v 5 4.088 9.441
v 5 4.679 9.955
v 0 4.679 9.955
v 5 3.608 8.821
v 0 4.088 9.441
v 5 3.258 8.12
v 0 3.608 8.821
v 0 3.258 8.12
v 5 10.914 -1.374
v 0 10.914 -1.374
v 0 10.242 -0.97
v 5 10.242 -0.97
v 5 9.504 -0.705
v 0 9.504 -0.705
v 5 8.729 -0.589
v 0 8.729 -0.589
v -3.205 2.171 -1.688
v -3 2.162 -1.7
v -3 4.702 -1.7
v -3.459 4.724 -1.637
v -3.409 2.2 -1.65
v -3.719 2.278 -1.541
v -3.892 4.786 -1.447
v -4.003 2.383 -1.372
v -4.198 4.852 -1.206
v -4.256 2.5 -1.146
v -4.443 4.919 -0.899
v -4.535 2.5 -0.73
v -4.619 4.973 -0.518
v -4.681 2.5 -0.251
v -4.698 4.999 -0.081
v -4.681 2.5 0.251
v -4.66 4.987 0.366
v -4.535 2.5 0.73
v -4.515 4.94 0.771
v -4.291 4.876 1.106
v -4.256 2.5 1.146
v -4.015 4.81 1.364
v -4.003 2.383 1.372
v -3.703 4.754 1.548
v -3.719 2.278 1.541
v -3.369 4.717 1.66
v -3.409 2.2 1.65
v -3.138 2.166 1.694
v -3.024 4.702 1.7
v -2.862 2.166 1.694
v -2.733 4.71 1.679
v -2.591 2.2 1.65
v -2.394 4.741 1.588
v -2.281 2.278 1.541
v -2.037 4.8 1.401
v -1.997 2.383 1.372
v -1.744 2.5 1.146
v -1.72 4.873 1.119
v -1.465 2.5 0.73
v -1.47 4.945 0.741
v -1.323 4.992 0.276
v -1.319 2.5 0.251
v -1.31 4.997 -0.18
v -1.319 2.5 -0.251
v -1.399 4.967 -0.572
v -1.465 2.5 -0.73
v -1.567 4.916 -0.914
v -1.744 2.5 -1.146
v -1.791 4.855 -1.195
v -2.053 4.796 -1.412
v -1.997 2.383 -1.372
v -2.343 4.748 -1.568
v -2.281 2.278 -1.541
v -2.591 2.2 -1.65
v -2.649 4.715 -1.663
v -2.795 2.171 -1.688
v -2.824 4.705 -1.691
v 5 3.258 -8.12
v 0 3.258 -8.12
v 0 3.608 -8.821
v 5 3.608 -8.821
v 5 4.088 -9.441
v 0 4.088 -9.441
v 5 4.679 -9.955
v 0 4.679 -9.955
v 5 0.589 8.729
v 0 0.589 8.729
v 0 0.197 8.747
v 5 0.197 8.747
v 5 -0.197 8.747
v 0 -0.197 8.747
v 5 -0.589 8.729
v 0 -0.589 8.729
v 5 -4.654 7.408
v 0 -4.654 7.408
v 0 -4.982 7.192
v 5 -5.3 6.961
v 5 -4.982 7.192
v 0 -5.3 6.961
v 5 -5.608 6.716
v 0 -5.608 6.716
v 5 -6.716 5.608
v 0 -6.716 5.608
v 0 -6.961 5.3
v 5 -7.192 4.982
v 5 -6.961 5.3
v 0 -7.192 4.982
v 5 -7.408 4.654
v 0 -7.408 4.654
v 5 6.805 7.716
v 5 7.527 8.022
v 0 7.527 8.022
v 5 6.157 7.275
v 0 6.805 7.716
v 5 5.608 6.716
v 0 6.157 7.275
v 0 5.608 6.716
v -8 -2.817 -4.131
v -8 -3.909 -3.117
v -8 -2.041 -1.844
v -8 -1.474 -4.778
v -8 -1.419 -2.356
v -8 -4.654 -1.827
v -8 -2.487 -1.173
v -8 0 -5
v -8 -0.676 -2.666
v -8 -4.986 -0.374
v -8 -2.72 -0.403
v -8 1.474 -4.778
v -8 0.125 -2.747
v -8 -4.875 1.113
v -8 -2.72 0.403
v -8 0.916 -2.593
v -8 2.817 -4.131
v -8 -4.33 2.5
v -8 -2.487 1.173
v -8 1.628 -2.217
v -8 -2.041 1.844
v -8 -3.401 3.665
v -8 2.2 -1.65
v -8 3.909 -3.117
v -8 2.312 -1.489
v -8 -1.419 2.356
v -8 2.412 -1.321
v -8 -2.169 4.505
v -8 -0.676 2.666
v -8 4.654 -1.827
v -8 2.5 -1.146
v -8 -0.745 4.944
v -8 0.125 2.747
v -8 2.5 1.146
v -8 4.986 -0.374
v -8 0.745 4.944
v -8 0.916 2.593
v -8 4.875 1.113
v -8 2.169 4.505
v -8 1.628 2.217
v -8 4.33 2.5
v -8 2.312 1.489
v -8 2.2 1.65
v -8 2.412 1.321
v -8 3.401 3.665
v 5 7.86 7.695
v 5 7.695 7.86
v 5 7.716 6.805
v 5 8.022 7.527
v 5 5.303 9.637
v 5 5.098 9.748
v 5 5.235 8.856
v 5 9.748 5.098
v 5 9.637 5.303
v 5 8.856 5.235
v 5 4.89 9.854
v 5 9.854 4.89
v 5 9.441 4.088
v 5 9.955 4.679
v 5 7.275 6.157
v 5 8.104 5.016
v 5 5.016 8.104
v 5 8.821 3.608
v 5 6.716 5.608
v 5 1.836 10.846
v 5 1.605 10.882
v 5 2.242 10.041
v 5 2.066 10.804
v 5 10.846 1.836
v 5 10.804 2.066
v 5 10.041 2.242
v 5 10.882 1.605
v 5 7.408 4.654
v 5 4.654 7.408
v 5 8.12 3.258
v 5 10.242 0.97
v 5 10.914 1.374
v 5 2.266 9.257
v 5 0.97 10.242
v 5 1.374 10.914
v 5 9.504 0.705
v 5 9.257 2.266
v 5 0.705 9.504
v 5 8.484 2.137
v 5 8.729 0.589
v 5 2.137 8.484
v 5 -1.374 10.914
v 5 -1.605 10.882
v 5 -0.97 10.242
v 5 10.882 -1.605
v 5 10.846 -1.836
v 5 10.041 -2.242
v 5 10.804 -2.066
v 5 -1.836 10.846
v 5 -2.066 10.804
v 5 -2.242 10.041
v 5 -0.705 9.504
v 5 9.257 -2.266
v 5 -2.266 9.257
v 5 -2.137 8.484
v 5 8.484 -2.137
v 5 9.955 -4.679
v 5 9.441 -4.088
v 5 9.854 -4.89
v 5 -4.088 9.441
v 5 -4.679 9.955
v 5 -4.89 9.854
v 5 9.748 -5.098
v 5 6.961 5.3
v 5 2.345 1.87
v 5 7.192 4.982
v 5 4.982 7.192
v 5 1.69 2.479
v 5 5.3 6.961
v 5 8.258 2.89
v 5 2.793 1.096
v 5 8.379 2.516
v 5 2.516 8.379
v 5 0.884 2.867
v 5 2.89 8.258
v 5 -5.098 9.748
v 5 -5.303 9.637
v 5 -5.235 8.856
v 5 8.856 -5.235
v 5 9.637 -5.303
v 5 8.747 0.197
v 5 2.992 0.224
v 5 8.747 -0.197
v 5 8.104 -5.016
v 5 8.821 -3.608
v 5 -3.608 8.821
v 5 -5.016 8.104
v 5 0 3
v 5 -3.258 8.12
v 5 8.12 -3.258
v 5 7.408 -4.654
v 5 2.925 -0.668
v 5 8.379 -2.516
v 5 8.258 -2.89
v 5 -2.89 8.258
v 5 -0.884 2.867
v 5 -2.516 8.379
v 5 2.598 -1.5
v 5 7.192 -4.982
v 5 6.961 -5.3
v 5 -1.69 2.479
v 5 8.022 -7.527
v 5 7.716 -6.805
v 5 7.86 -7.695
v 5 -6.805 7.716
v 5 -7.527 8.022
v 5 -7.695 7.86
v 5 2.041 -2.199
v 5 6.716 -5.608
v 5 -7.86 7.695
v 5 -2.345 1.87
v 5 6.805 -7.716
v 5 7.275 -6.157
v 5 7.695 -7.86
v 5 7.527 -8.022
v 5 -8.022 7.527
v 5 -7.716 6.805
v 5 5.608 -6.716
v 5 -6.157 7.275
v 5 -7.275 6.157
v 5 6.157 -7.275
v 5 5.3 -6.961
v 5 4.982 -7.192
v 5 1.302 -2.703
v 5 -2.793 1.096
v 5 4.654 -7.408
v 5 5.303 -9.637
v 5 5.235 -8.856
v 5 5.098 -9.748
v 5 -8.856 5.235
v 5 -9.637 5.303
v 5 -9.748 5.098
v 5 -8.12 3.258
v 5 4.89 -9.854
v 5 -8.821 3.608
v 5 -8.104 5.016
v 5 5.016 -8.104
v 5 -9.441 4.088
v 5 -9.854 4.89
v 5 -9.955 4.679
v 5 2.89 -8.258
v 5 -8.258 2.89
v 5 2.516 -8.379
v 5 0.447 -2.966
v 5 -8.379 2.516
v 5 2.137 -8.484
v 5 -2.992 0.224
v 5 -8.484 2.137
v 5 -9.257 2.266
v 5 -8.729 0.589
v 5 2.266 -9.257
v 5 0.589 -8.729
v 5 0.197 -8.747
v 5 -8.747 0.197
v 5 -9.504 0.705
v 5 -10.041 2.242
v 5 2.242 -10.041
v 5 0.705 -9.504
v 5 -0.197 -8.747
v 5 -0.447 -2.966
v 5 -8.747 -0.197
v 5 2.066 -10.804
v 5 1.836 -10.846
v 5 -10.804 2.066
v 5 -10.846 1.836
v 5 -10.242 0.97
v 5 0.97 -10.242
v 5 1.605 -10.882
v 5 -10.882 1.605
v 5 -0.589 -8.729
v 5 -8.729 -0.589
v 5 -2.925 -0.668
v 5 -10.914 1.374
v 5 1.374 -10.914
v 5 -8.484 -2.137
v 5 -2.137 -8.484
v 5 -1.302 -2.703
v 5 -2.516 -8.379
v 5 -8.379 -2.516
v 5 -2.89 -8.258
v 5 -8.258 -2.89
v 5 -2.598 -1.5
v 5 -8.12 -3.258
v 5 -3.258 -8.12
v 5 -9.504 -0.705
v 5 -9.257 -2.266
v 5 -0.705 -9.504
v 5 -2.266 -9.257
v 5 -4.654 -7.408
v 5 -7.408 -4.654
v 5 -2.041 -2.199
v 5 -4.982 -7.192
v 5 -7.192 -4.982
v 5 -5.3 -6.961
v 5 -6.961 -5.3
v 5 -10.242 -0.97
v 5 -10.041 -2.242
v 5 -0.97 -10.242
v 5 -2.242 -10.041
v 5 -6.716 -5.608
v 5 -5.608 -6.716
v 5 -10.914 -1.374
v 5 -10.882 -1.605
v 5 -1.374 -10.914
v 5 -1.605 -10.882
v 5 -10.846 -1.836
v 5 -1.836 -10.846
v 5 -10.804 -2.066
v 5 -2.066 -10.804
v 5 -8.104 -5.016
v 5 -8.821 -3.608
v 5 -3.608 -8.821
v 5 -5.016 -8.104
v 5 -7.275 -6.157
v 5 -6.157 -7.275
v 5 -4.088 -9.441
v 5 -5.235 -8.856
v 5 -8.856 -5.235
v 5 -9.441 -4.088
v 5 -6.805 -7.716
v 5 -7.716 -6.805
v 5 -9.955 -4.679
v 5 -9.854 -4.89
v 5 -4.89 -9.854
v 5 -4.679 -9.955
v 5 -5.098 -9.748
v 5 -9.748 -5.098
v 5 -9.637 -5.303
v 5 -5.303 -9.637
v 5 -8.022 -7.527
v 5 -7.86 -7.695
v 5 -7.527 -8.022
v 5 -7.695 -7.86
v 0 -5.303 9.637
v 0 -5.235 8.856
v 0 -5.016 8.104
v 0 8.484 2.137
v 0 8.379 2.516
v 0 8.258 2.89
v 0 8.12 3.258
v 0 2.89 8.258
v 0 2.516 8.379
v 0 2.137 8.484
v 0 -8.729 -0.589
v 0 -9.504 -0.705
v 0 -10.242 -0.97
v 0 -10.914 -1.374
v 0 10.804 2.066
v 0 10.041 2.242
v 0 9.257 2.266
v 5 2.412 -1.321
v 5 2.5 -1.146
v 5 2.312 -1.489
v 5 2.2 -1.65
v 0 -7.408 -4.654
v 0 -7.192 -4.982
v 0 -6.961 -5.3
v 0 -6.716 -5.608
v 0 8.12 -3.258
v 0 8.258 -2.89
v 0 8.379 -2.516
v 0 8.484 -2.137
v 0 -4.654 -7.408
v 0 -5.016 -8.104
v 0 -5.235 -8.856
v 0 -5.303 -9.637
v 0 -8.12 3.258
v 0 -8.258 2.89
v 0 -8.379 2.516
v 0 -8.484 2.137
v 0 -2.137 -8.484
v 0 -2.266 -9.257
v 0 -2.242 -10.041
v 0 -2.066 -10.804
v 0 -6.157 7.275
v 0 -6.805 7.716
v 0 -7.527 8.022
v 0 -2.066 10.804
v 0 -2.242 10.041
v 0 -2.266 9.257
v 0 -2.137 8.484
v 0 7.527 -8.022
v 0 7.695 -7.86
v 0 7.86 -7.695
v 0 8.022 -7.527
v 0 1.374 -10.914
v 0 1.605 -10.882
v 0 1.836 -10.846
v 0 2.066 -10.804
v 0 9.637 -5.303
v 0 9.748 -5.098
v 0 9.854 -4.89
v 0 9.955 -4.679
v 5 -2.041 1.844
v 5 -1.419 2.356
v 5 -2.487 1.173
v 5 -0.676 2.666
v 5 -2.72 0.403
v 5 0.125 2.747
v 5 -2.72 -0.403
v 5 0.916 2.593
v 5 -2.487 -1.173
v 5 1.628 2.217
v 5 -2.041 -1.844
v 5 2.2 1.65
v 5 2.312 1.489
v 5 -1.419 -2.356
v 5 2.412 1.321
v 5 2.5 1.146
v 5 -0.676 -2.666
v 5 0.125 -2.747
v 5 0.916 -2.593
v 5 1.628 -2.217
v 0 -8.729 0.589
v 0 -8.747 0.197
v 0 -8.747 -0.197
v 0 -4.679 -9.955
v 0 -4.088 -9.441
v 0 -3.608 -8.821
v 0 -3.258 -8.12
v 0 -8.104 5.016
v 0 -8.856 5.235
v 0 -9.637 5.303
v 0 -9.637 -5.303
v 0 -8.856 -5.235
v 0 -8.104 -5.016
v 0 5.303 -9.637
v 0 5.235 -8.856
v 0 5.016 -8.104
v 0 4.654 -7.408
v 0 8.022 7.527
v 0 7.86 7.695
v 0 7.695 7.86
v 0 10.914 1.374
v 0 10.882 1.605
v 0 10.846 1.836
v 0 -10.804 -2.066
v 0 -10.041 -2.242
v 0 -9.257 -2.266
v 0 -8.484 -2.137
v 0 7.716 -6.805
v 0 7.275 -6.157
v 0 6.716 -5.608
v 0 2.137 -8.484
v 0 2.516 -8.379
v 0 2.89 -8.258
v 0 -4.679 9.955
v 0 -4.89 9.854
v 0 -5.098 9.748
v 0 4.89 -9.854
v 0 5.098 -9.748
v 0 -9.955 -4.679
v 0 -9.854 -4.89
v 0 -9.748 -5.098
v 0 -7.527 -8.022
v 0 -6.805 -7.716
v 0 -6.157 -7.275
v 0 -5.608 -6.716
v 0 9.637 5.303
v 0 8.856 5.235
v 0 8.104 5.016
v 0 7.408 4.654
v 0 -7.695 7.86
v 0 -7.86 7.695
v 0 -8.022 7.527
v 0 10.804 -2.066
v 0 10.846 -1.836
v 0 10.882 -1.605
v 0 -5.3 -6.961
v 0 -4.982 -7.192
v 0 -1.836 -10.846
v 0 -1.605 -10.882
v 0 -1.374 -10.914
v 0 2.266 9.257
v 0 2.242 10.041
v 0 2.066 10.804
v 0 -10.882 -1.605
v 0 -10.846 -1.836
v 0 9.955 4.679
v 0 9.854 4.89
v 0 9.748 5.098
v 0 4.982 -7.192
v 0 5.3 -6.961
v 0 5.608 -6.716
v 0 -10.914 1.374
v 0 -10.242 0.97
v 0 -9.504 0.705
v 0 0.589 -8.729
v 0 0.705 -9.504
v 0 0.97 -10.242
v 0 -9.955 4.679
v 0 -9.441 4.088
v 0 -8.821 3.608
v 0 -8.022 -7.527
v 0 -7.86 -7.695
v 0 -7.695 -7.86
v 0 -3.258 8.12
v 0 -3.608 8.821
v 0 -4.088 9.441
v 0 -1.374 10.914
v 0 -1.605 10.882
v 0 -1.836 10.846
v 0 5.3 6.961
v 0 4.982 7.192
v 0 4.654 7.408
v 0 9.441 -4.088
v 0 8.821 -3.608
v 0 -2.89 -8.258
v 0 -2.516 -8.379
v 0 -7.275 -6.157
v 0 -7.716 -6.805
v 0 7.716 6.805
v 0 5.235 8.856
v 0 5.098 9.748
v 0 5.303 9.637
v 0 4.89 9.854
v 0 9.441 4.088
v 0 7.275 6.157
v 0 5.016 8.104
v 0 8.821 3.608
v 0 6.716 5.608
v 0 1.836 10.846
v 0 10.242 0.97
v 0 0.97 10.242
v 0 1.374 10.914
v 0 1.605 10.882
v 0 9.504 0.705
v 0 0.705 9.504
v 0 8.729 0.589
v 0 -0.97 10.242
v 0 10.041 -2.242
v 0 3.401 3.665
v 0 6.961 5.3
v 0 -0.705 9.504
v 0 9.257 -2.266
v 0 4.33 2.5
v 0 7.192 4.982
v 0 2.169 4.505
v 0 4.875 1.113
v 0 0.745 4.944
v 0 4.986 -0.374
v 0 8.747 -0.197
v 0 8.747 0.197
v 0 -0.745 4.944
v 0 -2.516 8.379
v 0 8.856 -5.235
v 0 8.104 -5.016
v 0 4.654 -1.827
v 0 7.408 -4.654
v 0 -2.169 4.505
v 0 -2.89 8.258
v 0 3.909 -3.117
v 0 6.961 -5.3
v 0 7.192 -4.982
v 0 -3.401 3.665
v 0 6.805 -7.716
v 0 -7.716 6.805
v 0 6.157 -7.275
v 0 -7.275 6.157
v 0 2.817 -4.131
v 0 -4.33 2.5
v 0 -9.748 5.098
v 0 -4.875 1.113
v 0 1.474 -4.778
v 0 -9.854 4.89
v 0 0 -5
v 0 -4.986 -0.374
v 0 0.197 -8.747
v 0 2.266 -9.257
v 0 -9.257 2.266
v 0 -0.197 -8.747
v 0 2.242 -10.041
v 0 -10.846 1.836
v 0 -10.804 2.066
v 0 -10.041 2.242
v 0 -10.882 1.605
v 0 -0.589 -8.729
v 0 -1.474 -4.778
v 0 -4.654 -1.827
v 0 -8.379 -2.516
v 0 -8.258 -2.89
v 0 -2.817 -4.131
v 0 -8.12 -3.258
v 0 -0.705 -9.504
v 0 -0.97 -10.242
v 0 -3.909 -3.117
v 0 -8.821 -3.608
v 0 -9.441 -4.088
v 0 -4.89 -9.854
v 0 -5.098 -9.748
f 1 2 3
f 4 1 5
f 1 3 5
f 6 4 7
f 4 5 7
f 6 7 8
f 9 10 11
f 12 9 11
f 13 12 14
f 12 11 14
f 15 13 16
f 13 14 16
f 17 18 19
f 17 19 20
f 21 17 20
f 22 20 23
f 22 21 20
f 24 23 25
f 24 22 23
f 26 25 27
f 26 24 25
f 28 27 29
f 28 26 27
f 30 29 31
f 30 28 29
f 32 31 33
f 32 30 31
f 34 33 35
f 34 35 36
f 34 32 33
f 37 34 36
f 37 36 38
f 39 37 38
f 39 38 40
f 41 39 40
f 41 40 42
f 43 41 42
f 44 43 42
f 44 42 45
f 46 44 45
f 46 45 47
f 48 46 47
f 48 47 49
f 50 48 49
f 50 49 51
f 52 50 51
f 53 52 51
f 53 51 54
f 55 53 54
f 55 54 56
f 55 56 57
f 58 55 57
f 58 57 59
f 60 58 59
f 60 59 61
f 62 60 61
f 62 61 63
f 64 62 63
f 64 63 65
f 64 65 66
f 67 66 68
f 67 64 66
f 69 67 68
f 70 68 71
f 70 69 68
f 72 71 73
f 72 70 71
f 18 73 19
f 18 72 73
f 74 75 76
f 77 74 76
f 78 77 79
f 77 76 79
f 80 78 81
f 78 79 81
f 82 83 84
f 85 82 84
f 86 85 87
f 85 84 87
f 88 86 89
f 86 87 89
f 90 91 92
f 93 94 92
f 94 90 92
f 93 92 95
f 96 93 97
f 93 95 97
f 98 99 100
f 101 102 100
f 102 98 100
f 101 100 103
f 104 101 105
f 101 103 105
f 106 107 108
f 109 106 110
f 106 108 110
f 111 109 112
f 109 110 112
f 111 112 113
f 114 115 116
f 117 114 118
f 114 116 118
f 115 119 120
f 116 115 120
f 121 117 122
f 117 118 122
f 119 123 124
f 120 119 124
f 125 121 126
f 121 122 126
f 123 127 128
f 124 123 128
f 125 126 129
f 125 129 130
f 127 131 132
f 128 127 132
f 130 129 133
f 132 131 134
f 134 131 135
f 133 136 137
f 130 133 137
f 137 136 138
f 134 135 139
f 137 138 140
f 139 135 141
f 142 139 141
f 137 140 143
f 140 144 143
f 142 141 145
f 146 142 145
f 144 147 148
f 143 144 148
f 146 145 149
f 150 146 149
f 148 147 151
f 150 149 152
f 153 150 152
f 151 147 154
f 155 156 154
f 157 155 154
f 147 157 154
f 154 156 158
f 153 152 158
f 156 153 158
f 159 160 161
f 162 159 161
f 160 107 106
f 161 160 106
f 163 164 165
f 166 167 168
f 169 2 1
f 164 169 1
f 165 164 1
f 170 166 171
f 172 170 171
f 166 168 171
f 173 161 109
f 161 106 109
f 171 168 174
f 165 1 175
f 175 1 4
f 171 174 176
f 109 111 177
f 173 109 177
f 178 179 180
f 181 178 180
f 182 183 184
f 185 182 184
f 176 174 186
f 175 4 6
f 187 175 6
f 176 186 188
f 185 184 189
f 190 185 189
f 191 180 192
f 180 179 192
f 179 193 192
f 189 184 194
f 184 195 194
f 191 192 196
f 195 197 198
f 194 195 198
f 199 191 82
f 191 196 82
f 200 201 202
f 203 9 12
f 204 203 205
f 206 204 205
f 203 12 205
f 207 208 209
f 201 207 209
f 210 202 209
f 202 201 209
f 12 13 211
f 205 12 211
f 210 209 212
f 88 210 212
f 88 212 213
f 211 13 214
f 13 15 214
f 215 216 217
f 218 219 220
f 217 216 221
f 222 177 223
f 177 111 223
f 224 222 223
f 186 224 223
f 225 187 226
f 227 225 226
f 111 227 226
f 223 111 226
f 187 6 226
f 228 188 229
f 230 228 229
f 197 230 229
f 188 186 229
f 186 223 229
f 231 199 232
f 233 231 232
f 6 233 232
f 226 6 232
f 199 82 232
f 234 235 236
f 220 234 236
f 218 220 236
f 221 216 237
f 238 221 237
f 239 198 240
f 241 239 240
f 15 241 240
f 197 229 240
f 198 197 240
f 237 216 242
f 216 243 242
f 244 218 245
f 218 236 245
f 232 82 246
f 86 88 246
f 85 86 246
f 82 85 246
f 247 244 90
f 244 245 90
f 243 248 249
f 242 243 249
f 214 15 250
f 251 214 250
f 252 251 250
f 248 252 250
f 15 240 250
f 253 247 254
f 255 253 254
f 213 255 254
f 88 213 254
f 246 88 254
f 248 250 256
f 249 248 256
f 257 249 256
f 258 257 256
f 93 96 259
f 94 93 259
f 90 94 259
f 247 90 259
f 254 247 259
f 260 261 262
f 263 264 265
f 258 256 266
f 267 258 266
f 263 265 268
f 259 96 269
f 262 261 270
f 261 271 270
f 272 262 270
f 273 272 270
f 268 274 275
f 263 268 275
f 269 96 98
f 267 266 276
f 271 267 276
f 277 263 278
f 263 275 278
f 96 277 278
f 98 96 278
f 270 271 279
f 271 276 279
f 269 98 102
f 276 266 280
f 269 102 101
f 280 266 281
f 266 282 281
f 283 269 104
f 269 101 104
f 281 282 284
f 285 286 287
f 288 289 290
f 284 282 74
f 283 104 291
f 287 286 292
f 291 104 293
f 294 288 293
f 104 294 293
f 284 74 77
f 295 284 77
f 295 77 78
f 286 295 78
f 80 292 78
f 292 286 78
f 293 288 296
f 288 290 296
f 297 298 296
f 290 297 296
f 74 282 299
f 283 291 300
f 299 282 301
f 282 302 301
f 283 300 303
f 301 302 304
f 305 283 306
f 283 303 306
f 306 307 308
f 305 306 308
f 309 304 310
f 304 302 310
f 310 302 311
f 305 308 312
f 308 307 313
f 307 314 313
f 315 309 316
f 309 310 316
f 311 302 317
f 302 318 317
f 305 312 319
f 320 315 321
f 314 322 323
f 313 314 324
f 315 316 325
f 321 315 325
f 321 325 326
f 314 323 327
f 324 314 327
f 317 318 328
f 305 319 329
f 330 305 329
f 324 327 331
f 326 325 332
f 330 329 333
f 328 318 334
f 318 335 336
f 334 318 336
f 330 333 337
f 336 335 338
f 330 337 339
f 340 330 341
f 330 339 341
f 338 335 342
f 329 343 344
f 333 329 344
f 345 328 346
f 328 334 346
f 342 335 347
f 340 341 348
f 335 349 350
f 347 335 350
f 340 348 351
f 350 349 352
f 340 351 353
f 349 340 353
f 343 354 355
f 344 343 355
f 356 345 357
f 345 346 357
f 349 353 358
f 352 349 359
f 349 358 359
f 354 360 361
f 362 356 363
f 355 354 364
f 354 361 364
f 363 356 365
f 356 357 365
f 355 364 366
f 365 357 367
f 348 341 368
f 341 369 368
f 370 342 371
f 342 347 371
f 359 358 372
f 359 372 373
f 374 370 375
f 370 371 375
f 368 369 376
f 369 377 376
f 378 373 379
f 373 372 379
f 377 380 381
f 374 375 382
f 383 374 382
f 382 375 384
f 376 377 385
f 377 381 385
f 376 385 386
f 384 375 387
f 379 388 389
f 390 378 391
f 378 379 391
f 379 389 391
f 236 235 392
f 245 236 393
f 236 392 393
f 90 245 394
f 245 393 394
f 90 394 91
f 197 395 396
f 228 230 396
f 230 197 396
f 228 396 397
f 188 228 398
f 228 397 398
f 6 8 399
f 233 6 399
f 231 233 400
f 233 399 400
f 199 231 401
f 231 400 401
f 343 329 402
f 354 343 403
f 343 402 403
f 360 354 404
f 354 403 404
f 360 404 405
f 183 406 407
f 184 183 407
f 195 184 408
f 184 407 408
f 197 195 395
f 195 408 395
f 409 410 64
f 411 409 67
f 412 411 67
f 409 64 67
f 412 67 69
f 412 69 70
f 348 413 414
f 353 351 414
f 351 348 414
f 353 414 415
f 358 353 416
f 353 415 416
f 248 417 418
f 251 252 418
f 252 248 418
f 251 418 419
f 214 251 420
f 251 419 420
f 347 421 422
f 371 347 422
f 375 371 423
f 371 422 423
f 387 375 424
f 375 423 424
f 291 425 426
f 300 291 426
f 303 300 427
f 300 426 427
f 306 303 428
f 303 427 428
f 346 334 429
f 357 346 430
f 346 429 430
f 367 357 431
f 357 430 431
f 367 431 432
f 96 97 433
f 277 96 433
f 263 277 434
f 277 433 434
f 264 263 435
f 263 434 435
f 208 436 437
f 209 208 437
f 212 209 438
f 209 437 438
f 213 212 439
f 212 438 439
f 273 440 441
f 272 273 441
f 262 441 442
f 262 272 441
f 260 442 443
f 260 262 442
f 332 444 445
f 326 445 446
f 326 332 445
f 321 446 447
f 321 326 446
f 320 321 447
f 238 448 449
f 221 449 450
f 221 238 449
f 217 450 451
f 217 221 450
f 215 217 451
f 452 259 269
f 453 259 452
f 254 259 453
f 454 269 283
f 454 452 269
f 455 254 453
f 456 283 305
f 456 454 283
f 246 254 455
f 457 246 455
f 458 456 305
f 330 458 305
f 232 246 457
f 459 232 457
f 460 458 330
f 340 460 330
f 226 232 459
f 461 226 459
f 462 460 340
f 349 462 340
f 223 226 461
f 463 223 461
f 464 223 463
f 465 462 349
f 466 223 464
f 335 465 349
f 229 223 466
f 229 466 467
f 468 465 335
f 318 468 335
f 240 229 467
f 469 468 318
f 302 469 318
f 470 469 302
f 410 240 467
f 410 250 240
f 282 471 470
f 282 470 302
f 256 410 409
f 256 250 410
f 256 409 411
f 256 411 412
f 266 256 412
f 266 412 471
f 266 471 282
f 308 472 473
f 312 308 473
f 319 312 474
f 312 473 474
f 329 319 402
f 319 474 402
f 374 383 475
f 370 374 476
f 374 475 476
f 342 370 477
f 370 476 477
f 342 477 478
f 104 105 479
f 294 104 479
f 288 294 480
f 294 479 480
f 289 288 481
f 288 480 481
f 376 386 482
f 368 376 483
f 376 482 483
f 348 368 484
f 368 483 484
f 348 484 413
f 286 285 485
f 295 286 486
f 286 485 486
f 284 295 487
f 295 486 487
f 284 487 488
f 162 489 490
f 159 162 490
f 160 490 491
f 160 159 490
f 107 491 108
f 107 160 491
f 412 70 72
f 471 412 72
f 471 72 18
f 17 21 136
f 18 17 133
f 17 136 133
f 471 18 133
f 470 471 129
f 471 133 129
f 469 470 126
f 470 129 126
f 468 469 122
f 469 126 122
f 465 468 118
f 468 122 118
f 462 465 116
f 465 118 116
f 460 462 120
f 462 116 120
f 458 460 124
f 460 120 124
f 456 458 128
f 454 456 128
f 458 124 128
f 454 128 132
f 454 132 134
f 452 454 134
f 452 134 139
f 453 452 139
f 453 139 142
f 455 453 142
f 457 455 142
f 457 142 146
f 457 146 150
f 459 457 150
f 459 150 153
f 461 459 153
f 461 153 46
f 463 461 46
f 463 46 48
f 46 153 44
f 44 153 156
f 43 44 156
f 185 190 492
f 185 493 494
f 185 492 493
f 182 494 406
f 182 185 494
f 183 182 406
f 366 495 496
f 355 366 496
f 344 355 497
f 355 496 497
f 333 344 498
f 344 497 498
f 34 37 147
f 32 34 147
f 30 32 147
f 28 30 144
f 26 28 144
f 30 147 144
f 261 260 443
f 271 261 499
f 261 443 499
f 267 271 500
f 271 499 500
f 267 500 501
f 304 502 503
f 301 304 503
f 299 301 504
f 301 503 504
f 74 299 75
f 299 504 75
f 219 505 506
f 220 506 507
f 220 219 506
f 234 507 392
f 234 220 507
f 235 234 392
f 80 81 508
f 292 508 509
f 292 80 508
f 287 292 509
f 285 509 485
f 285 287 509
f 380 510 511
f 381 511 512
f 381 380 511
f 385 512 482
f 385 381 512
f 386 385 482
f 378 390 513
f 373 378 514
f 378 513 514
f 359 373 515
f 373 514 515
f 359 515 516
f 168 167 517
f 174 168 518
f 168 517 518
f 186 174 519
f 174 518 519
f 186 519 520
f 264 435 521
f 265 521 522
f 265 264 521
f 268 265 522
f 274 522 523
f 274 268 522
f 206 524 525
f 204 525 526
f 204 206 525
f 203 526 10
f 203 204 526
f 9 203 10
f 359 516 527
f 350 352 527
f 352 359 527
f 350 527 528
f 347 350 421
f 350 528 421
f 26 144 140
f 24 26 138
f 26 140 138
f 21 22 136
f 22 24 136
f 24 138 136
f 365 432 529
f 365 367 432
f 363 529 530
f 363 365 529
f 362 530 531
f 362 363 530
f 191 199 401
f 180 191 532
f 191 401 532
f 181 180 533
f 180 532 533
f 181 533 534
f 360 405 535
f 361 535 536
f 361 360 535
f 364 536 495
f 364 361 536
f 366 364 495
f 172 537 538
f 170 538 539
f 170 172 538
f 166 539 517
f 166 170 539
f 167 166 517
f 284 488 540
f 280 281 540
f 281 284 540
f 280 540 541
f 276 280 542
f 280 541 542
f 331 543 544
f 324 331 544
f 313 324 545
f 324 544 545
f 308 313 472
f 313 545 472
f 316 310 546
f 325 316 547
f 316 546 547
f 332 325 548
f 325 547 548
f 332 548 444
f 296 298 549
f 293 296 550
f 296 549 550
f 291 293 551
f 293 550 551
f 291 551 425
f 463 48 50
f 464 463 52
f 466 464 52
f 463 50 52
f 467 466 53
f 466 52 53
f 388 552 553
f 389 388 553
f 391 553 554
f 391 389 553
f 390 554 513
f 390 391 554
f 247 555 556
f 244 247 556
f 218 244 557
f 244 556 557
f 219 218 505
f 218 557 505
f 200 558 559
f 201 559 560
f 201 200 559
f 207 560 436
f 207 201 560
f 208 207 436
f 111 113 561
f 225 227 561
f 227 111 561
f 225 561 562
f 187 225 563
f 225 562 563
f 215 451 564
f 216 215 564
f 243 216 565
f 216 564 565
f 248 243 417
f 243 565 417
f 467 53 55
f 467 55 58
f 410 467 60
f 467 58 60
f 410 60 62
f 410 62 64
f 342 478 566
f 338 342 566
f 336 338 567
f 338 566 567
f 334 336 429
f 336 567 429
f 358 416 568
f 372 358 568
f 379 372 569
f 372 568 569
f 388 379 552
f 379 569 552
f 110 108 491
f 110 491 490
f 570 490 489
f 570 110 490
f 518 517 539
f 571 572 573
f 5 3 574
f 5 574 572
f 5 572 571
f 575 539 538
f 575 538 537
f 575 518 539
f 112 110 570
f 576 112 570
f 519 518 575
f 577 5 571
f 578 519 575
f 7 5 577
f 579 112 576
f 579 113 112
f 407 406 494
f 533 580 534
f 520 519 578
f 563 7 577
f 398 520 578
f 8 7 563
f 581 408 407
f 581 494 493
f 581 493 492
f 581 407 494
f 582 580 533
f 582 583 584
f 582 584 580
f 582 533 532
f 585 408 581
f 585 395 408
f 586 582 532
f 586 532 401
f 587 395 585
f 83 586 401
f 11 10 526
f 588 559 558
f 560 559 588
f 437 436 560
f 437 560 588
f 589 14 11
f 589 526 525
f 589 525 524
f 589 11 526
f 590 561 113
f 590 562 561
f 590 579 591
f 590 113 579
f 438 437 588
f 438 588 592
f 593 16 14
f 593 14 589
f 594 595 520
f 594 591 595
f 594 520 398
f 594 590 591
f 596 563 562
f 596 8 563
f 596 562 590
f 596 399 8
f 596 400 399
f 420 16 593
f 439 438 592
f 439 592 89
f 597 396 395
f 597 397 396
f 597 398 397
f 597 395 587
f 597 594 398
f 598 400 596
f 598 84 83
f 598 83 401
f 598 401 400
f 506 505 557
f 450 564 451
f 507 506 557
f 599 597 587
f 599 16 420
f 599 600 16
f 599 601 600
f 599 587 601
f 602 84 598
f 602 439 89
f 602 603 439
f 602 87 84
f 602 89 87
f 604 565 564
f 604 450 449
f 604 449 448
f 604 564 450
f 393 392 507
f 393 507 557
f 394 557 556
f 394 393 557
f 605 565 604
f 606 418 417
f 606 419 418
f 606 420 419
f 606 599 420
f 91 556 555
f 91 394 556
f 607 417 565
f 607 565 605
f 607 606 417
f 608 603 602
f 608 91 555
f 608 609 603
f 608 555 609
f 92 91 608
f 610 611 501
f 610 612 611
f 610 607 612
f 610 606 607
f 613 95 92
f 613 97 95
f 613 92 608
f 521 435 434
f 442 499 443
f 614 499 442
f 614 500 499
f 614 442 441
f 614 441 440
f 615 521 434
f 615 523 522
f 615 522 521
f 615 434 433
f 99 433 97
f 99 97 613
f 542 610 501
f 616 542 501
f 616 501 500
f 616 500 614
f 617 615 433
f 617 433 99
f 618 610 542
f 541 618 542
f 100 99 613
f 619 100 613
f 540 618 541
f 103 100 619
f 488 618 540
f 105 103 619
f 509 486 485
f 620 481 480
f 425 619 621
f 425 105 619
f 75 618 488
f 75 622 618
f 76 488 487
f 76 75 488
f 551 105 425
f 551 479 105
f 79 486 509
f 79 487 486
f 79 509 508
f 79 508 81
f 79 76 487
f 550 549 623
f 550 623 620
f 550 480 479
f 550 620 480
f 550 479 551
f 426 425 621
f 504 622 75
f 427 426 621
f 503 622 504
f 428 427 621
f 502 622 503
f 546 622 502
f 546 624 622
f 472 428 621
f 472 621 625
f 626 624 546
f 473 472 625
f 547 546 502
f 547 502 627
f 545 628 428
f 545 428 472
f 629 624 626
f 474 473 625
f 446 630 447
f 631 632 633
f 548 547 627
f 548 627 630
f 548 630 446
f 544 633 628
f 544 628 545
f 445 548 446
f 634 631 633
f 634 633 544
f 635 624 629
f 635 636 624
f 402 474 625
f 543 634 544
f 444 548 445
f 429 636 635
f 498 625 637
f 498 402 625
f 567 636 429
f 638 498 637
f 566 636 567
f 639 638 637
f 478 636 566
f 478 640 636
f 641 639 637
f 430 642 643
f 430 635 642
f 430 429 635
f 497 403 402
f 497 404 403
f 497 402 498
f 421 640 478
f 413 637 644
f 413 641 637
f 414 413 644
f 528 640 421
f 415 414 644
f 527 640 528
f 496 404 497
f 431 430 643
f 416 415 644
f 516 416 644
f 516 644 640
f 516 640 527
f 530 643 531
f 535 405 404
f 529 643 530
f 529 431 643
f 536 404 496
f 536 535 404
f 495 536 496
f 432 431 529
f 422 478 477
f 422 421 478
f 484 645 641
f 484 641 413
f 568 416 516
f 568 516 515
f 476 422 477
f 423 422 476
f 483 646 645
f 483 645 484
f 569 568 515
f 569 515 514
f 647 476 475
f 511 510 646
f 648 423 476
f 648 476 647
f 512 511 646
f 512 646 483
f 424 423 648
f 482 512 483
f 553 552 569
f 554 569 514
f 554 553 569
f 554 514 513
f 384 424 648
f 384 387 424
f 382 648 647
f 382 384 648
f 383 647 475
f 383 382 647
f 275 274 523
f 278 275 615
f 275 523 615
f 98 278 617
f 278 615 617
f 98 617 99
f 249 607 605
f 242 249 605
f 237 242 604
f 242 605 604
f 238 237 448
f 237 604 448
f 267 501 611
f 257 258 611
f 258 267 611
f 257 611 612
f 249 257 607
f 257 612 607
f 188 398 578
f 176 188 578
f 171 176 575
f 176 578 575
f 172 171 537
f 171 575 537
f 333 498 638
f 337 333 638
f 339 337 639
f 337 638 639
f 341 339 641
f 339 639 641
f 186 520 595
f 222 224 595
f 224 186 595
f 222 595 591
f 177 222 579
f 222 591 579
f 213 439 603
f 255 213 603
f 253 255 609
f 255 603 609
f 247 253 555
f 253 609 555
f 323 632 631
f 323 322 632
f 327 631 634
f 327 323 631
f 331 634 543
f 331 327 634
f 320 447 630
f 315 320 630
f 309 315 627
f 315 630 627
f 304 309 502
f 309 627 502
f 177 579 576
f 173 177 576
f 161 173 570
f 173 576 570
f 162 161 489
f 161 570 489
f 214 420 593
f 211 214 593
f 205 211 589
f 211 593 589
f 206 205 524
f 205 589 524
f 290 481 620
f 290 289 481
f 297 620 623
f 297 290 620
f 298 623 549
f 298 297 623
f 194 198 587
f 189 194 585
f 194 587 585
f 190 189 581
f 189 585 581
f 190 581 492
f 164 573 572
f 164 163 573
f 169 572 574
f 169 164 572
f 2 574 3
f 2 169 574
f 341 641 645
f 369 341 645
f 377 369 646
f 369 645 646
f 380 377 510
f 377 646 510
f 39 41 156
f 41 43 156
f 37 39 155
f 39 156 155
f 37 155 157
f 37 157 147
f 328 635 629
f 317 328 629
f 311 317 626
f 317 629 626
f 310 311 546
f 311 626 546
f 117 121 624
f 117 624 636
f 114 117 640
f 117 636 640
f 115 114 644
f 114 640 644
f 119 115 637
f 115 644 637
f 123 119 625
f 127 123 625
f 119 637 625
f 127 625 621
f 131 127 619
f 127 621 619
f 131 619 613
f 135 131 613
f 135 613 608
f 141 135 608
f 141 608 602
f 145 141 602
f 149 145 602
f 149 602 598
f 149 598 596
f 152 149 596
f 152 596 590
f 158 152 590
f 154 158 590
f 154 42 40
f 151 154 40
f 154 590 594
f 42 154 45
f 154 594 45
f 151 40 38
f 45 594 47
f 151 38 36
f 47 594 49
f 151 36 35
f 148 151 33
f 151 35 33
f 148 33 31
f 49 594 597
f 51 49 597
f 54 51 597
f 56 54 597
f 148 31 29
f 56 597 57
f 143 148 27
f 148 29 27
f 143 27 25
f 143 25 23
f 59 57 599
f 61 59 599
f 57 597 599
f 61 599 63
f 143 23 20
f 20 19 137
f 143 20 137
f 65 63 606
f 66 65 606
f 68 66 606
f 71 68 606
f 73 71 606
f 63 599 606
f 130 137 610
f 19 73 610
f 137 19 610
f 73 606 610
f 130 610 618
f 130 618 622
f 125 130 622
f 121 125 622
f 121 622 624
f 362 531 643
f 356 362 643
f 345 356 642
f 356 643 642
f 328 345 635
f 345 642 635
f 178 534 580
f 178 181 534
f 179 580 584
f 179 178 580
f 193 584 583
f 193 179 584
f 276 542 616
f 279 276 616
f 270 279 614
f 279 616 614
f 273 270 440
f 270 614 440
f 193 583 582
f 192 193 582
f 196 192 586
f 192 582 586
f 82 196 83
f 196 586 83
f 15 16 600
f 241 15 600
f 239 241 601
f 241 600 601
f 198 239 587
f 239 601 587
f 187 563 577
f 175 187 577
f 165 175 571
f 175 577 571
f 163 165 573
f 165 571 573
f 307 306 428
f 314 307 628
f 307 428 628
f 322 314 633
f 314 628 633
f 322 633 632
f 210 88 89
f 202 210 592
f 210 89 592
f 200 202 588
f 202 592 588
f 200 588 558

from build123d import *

# Parameters (mm, degrees)
BASPROSKE_W             = 5
BASPROSKE_H             = 11
TOOTHCUT_DEPTH          = 17.340134638
TEETHCUTS_COUNT         = 20
TEETHCUTS_ANGLE         = 342
HUBNEAONESKE_R          = 5
HUBNEARONE_DEPTH        = 10.0000508
BORSKE_R                = 3
BORE_DEPTH              = 15.0000508
BOSS_EXTRUDE1_START     = -10.000051
SKETCH2_R               = 3
BOSS_EXTRUDE1_DEPTH     = 15.0000508
SKETCH3_R               = 1.7
CUT_EXTRUDE1_DEPTH      = 10
SKETCH4_W               = 2
SKETCH4_H               = 20.201666504
CUT_EXTRUDE2_DEPTH      = 19.39087628
CUT_EXTRUDE2_DEPTH_BACK = 19.39087628
CUT_EXTRUDE3_DEPTH      = 31


with BuildPart() as part:
    # BasProSke → Base-Revolve (revolve)
    with BuildSketch(Plane(origin=(0, 0, 0), x_dir=(1, 0, 0), z_dir=(0, 1, 0)), mode=Mode.PRIVATE) as base_revolve_sk:
        with Locations((2.5, 5.5)):
            Rectangle(BASPROSKE_W, BASPROSKE_H)
    revolve(base_revolve_sk.sketch.rotate(Axis((-10, 0, 0), (1, 0, 0)), 180), axis=Axis((-10, 0, 0), (1, 0, 0)))

    # TooCutSke → ToothCut (cut, through all)
    with BuildSketch(Plane(origin=(0, 0, 0), x_dir=(0, 0, -1), z_dir=(1, 0, 0))):
        with BuildLine():
            ThreePointArc((0.589353609, 8.729127295), (0, 8.749), (-0.589353609, 8.729127295))
            ThreePointArc((-0.589353609, 8.729127295), (-0.82475631, 9.893403384), (-1.391689312, 10.937213814))
            ThreePointArc((-1.391689312, 10.937213814), (0, 11.0254), (1.391689312, 10.937213814))
            ThreePointArc((1.391689312, 10.937213814), (0.82475631, 9.893403384), (0.589353609, 8.729127295))
        make_face()
    toothcut = extrude(amount=TOOTHCUT_DEPTH, mode=Mode.SUBTRACT)

    # TeethCuts: ToothCut ×20 about axis
    teethcuts_axis = Axis((-10, 0, 0), (1, 0, 0))
    for i in range(1, TEETHCUTS_COUNT):
        add(toothcut.rotate(teethcuts_axis, i * TEETHCUTS_ANGLE / (TEETHCUTS_COUNT - 1)), mode=Mode.SUBTRACT)

    # HubNeaOneSke → HubNearOne (add)
    with BuildSketch(Plane.ZY):
        with Locations(Location((0, 0, 0), (0, 0, 180))):
            Circle(HUBNEAONESKE_R)
    extrude(amount=HUBNEARONE_DEPTH)

    # BorSke → Bore (cut, symmetric)
    with BuildSketch(Plane(origin=(0, 0, 0), x_dir=(0, 0, -1), z_dir=(1, 0, 0))):
        with Locations(Location((0, 0, 0), (0, 0, 180))):
            Circle(BORSKE_R)
    extrude(amount=BORE_DEPTH, both=True, mode=Mode.SUBTRACT)

    # Sketch2 → Boss-Extrude1 (add)
    with BuildSketch(Plane(origin=(0, 0, 0), x_dir=(0, 0, -1), z_dir=(1, 0, 0)).offset(BOSS_EXTRUDE1_START)):
        Circle(SKETCH2_R)
        with BuildLine():
            Line((-1.65, 2.2), (1.65, 2.2))
            ThreePointArc((1.65, 2.2), (0, -2.75), (-1.65, 2.2))
        make_face(mode=Mode.SUBTRACT)
    extrude(amount=BOSS_EXTRUDE1_DEPTH)

    # Sketch3 → Cut-Extrude1 (cut)
    with BuildSketch(Plane(origin=(0, 0, 0), x_dir=(1, 0, 0), z_dir=(0, 1, 0))):
        with Locations(Location((-3.0000508, 0, 0), (0, 0, 90))):
            Circle(SKETCH3_R)
    extrude(amount=CUT_EXTRUDE1_DEPTH, mode=Mode.SUBTRACT)

    # Sketch4 → Cut-Extrude2 (cut, two sides)
    with BuildSketch(Plane.XY) as cut_extrude2_sk:
        with Locations((-9.0000508, 0)):
            Rectangle(SKETCH4_W, SKETCH4_H)
    extrude(amount=CUT_EXTRUDE2_DEPTH, mode=Mode.SUBTRACT)
    extrude(cut_extrude2_sk.sketch, amount=-CUT_EXTRUDE2_DEPTH_BACK, mode=Mode.SUBTRACT)

    # Sketch5 → Cut-Extrude3 (cut)
    with BuildSketch(Plane.ZY.offset(8.0000508)):
        with BuildLine():
            Line((1.145643924, 2.5), (0, 2.5))
            Line((0, 2.5), (-1.145643924, 2.5))
            ThreePointArc((-1.145643924, 2.5), (-1.40584716, 2.363491858), (-1.65, 2.2))
            Line((-1.65, 2.2), (1.65, 2.2))
            ThreePointArc((1.65, 2.2), (1.40584716, 2.363491858), (1.145643924, 2.5))
        make_face()
    extrude(amount=-CUT_EXTRUDE3_DEPTH, mode=Mode.SUBTRACT)


solid = part.part
